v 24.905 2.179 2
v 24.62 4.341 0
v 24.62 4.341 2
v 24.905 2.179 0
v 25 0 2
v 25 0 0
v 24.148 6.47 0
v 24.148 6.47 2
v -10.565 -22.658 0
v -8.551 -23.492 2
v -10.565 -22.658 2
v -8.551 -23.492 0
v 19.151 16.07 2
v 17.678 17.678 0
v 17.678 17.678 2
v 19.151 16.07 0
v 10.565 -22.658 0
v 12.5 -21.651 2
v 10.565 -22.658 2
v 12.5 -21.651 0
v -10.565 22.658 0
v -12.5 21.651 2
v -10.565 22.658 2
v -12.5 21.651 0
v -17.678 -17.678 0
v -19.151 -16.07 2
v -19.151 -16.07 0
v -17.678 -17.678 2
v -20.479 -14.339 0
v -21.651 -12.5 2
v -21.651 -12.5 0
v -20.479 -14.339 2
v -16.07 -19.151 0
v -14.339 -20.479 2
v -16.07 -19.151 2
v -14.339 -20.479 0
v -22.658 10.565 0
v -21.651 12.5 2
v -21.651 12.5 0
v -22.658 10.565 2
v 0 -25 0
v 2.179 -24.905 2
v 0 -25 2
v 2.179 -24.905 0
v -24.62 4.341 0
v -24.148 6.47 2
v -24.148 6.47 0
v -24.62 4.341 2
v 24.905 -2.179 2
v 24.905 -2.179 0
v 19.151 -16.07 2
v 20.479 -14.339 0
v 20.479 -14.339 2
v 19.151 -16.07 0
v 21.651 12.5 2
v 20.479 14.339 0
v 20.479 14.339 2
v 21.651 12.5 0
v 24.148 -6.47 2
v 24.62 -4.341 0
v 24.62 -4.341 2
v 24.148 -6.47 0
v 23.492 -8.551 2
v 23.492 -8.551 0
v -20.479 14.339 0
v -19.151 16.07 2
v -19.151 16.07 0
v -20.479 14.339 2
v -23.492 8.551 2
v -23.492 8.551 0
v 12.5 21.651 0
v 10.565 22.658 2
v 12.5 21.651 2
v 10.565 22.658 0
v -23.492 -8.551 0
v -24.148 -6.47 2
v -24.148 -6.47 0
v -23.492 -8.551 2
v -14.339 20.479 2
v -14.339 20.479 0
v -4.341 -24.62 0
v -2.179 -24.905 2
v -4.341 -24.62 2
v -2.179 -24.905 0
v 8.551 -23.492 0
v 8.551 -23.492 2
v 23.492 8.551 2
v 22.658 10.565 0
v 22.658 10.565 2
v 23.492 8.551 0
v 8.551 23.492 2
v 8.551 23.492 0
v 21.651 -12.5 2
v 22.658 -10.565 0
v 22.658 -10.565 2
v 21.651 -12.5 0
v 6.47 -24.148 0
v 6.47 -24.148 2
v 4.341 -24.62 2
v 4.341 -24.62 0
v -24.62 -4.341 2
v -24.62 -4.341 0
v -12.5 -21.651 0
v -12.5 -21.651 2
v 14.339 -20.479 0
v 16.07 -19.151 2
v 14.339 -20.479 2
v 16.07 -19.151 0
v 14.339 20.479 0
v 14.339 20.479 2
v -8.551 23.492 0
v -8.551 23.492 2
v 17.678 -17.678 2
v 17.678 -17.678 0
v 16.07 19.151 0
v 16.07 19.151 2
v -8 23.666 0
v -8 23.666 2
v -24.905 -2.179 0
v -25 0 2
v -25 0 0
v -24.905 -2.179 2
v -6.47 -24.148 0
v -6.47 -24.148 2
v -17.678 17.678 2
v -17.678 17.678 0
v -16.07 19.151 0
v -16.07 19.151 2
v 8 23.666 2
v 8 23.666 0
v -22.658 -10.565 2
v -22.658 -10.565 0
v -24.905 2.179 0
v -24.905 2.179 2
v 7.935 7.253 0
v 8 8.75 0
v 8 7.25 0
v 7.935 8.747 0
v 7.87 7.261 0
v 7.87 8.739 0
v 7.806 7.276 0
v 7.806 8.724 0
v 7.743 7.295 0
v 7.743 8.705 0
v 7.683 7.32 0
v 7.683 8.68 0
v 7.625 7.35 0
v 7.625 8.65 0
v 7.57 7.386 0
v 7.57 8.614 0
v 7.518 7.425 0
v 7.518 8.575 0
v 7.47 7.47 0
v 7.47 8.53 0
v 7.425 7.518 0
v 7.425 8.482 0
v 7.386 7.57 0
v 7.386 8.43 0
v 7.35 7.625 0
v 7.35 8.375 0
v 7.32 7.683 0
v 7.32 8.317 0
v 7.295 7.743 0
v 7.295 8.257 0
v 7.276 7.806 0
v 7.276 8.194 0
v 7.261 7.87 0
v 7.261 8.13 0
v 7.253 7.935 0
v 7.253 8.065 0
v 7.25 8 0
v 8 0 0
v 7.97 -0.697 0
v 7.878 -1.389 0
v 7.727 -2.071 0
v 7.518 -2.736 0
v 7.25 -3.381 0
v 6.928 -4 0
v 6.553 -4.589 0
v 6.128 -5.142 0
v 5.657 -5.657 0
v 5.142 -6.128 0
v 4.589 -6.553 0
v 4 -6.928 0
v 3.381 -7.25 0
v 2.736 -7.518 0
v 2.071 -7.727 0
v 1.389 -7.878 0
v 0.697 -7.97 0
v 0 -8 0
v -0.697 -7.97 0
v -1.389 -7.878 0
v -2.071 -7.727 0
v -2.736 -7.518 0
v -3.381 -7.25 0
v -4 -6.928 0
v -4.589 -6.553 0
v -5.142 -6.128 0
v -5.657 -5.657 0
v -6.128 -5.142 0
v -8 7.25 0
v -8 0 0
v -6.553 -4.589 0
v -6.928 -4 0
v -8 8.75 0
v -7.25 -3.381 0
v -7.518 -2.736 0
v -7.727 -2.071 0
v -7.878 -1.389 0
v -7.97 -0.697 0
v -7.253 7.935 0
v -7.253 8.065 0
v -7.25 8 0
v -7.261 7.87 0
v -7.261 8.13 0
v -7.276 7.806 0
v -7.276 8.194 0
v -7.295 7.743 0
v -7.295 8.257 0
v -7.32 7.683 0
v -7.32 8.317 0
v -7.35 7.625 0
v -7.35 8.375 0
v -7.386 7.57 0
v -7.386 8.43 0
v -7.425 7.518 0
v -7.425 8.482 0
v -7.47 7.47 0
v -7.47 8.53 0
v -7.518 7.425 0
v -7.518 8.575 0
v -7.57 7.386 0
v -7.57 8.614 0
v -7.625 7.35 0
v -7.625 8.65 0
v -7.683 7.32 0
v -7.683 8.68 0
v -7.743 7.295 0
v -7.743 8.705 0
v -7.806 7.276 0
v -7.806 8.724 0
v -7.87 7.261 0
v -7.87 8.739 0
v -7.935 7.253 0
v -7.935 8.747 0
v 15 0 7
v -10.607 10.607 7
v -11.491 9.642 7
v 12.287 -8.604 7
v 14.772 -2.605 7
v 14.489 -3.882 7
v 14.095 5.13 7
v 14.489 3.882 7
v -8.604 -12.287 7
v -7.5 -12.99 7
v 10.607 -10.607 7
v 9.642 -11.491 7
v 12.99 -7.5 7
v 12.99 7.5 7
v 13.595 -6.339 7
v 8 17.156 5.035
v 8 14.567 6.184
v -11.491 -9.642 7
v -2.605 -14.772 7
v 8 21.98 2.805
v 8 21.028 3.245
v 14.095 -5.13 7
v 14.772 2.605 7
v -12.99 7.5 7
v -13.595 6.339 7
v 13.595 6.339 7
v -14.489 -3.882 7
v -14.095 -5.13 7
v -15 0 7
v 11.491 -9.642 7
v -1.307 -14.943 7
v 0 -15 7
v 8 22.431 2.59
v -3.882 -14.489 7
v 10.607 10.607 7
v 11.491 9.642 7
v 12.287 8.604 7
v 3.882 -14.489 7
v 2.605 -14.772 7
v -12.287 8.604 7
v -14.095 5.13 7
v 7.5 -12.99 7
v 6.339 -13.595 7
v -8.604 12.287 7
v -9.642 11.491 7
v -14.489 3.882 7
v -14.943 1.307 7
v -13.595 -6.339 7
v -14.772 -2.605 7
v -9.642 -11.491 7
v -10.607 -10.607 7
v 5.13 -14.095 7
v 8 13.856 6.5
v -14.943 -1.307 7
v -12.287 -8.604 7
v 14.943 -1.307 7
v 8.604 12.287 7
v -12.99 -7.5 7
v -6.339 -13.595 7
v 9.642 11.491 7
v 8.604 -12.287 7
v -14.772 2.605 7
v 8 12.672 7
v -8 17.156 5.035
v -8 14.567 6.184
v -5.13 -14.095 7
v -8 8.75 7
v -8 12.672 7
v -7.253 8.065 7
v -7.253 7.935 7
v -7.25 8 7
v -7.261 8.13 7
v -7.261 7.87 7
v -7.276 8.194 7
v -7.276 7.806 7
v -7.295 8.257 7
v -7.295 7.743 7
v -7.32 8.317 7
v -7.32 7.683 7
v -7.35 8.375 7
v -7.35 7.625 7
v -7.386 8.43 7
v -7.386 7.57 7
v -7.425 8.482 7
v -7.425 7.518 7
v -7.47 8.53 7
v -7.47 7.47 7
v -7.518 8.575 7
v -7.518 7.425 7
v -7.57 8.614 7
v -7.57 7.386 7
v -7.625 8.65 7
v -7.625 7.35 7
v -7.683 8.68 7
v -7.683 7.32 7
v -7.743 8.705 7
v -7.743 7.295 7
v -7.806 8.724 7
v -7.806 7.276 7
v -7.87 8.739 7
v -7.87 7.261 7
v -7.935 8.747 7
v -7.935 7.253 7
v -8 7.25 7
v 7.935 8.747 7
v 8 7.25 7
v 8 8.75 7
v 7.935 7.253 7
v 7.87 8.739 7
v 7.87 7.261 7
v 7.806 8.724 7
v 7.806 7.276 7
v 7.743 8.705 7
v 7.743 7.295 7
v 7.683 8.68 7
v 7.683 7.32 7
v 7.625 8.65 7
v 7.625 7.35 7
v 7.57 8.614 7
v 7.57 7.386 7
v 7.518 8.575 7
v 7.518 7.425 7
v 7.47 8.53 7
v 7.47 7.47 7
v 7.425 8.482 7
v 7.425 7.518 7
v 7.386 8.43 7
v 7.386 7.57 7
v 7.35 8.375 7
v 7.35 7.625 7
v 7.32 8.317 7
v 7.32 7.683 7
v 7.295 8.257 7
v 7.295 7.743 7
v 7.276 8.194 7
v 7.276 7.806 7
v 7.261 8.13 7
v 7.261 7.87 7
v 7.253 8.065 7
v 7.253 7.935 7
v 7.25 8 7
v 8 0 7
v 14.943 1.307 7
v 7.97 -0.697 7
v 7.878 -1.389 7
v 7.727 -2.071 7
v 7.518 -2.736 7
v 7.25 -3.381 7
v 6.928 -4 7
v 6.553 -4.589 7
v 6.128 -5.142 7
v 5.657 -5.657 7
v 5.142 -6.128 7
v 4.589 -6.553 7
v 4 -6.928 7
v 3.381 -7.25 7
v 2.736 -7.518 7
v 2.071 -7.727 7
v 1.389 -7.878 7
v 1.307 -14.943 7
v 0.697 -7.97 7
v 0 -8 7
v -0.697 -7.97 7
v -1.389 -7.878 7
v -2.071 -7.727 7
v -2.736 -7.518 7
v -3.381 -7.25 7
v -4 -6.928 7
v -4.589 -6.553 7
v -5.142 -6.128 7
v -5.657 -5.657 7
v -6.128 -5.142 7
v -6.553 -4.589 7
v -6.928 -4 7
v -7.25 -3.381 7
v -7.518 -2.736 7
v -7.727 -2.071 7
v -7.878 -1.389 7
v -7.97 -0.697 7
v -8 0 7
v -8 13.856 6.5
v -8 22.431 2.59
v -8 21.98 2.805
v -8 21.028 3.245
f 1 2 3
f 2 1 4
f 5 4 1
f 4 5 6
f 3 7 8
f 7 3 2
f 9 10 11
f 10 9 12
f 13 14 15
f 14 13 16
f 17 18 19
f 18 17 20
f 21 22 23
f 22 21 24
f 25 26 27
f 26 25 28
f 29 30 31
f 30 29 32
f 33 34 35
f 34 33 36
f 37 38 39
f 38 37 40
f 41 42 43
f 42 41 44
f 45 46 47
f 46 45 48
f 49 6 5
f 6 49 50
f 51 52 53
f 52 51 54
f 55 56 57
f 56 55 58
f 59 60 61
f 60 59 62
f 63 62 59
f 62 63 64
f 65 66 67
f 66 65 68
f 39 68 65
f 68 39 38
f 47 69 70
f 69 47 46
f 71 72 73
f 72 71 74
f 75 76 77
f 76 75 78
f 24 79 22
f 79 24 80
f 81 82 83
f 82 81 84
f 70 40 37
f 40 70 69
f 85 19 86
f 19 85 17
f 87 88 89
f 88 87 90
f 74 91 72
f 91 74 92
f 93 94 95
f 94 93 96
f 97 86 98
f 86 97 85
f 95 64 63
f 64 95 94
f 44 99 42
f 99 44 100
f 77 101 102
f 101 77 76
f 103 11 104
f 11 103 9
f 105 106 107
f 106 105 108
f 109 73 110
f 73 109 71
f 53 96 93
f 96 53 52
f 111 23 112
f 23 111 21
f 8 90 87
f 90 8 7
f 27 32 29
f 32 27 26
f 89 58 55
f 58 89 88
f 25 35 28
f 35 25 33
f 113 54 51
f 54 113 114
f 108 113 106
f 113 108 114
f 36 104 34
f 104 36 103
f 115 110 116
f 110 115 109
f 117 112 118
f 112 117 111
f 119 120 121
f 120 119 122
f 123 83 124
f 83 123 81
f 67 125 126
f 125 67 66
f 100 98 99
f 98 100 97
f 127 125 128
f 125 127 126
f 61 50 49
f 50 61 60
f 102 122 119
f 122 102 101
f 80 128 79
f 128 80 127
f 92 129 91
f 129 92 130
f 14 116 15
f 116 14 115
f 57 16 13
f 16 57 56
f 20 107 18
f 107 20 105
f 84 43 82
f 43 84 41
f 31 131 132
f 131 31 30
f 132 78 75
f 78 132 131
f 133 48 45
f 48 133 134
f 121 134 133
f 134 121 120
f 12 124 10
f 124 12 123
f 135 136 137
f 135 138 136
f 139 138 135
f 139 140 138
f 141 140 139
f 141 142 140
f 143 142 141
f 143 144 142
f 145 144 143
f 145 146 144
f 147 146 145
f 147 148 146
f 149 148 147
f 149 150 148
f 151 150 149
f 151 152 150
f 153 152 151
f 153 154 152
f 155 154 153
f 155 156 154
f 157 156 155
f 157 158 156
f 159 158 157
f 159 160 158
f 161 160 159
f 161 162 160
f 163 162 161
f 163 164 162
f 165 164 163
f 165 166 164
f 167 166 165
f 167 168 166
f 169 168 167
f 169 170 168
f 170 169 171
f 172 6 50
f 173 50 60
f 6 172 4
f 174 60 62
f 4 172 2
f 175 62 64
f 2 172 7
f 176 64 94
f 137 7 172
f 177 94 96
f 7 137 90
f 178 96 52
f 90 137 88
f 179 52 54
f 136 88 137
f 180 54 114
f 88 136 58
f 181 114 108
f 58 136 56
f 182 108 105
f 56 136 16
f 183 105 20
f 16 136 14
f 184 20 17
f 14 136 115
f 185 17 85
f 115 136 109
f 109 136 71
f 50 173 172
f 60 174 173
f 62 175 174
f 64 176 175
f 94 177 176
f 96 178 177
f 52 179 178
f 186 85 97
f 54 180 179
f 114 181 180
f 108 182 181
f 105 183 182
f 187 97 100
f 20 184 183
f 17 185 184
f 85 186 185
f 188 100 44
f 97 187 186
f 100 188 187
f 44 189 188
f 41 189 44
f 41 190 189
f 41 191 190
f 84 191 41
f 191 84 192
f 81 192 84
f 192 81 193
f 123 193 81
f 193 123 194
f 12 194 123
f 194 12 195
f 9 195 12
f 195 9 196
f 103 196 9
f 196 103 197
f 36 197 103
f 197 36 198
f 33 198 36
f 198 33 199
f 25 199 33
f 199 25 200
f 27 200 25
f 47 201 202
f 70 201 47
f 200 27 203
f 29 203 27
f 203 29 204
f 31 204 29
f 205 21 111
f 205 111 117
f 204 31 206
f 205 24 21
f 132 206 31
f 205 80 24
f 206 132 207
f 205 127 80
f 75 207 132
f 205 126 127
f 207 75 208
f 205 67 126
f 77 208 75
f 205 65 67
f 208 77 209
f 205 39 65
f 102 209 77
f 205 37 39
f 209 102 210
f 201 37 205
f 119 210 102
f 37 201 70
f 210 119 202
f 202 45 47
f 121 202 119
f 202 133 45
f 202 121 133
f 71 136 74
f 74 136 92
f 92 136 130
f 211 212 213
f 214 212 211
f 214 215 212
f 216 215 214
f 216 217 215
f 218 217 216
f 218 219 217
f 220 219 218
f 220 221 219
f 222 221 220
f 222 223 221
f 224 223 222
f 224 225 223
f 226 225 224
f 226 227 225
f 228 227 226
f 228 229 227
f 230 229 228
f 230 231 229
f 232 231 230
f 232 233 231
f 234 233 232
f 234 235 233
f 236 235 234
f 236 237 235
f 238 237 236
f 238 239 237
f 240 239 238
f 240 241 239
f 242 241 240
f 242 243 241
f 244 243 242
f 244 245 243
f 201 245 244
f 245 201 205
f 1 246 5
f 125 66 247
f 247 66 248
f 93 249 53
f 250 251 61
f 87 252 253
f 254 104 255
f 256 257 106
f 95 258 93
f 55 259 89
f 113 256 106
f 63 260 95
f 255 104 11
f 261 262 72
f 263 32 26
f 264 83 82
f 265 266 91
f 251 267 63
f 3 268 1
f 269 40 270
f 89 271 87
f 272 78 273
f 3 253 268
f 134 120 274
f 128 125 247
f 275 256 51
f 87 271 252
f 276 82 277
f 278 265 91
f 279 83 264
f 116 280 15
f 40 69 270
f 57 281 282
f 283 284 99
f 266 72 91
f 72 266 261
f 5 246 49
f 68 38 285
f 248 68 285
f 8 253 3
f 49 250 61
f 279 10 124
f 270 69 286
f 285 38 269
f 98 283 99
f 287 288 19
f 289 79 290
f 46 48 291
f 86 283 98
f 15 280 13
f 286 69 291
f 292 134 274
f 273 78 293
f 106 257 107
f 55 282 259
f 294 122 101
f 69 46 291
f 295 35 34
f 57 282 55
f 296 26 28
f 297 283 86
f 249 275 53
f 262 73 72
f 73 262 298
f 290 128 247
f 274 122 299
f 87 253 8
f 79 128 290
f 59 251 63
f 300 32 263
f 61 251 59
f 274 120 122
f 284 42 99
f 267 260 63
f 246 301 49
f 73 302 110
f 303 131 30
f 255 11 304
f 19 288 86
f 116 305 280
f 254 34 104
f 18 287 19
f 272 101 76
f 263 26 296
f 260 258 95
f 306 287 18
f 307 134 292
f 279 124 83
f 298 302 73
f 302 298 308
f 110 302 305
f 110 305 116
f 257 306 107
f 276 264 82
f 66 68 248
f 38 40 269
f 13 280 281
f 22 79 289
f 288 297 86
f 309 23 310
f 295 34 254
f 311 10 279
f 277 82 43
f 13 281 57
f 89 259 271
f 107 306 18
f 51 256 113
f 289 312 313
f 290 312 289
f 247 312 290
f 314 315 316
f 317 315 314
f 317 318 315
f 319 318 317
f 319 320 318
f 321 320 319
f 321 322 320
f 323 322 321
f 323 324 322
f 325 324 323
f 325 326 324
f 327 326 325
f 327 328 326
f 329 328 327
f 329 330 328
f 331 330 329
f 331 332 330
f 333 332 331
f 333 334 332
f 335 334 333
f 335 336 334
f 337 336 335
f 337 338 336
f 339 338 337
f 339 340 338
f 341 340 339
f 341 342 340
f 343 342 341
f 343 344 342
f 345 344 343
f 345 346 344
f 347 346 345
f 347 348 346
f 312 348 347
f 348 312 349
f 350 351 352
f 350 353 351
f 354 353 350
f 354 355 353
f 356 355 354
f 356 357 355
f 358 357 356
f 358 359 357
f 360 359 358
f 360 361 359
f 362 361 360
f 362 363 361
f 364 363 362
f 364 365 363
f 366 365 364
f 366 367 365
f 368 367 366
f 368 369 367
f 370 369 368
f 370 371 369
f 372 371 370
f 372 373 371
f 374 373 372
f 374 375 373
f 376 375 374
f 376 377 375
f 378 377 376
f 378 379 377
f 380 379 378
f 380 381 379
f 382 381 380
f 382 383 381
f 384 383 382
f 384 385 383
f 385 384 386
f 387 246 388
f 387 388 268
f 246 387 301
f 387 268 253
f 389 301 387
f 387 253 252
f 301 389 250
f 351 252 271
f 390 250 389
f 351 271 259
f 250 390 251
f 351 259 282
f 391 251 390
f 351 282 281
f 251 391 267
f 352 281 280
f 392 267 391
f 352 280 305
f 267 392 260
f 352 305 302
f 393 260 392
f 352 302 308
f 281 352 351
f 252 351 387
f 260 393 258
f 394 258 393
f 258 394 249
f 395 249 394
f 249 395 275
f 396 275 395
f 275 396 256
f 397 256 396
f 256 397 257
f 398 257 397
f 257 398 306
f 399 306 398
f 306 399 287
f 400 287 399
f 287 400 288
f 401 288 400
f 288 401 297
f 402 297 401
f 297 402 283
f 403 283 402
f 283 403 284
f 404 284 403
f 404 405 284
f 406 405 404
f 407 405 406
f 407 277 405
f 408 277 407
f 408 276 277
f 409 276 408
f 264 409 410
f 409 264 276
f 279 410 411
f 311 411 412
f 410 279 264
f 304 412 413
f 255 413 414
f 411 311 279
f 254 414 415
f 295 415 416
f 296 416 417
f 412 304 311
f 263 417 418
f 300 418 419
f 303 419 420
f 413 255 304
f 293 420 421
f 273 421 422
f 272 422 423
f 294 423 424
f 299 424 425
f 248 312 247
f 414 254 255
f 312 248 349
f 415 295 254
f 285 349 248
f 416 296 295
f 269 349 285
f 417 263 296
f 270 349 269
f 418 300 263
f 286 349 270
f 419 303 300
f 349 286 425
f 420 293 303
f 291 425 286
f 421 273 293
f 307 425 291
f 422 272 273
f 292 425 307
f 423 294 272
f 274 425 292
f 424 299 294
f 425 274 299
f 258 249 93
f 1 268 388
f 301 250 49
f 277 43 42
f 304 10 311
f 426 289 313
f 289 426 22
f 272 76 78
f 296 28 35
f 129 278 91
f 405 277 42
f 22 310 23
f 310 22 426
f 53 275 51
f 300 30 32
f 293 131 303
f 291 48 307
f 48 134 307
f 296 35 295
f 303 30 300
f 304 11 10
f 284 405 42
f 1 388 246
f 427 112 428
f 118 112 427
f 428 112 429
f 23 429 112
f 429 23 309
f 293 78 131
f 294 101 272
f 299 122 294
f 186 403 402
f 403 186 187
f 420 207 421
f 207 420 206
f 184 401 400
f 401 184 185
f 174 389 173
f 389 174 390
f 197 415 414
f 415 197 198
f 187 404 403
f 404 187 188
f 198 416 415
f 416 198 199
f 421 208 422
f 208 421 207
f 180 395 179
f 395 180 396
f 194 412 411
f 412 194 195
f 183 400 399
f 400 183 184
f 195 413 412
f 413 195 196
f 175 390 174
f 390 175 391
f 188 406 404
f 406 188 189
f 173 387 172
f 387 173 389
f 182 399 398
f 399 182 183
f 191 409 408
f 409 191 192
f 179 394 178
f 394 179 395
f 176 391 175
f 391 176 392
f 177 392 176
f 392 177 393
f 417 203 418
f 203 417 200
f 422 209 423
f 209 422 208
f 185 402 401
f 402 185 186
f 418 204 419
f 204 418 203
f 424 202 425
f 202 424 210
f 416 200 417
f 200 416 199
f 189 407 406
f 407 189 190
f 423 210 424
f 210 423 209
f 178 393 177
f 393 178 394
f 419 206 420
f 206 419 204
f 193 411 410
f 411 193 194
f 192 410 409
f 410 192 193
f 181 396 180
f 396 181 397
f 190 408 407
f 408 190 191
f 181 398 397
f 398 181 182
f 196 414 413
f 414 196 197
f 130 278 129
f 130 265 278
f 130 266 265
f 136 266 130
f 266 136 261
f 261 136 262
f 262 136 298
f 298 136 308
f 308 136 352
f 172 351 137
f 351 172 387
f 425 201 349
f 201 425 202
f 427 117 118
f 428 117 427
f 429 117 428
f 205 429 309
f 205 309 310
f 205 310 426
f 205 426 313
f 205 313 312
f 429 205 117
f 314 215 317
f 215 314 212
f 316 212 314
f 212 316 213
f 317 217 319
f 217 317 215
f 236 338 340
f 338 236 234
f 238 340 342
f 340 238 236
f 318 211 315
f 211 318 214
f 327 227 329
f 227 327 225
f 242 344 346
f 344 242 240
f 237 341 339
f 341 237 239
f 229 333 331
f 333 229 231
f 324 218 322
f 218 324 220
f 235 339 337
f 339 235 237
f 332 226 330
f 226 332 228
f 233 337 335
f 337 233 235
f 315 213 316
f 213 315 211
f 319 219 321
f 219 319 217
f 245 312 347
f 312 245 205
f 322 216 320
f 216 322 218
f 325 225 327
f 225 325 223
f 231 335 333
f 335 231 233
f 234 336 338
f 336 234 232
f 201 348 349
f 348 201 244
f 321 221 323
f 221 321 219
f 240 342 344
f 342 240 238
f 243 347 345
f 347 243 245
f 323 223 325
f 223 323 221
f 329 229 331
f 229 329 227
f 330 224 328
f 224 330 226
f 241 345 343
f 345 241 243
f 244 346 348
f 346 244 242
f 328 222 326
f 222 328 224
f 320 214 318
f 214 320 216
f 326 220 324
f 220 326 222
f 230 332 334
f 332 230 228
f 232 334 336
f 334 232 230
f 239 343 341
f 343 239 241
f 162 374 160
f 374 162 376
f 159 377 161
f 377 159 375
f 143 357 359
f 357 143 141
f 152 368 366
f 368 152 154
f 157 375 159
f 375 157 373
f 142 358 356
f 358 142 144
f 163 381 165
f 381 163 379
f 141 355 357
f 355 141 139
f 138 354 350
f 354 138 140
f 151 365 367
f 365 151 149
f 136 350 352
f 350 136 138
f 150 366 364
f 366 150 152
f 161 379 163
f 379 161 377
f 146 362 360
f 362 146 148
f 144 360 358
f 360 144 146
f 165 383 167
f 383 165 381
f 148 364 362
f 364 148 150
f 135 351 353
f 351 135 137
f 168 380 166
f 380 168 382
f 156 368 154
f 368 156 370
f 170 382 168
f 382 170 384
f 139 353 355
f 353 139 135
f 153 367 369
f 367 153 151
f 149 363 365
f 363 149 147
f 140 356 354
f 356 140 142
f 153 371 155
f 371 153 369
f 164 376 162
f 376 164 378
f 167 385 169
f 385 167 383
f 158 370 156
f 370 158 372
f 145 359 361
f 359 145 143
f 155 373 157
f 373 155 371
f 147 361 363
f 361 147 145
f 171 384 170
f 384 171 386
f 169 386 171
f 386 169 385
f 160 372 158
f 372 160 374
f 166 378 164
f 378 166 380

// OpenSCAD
$fn=72; // Decent curves please.

module base() {
    union() {
        cylinder(d=50, h=2);
        translate([0, 0, 2])
            cylinder(5, d1=50, d2=30, true);
    }
}

difference() {
    base();
    translate([0, 0, -10])
        cylinder(d=16, h=20);
    translate([-8, 0, -10])
        cube([16, 32, 20]);
}

translate([-8, 8, 0]) cylinder(d=1.5, h=7);
translate([8, 8, 0]) cylinder(d=1.5, h=7);
